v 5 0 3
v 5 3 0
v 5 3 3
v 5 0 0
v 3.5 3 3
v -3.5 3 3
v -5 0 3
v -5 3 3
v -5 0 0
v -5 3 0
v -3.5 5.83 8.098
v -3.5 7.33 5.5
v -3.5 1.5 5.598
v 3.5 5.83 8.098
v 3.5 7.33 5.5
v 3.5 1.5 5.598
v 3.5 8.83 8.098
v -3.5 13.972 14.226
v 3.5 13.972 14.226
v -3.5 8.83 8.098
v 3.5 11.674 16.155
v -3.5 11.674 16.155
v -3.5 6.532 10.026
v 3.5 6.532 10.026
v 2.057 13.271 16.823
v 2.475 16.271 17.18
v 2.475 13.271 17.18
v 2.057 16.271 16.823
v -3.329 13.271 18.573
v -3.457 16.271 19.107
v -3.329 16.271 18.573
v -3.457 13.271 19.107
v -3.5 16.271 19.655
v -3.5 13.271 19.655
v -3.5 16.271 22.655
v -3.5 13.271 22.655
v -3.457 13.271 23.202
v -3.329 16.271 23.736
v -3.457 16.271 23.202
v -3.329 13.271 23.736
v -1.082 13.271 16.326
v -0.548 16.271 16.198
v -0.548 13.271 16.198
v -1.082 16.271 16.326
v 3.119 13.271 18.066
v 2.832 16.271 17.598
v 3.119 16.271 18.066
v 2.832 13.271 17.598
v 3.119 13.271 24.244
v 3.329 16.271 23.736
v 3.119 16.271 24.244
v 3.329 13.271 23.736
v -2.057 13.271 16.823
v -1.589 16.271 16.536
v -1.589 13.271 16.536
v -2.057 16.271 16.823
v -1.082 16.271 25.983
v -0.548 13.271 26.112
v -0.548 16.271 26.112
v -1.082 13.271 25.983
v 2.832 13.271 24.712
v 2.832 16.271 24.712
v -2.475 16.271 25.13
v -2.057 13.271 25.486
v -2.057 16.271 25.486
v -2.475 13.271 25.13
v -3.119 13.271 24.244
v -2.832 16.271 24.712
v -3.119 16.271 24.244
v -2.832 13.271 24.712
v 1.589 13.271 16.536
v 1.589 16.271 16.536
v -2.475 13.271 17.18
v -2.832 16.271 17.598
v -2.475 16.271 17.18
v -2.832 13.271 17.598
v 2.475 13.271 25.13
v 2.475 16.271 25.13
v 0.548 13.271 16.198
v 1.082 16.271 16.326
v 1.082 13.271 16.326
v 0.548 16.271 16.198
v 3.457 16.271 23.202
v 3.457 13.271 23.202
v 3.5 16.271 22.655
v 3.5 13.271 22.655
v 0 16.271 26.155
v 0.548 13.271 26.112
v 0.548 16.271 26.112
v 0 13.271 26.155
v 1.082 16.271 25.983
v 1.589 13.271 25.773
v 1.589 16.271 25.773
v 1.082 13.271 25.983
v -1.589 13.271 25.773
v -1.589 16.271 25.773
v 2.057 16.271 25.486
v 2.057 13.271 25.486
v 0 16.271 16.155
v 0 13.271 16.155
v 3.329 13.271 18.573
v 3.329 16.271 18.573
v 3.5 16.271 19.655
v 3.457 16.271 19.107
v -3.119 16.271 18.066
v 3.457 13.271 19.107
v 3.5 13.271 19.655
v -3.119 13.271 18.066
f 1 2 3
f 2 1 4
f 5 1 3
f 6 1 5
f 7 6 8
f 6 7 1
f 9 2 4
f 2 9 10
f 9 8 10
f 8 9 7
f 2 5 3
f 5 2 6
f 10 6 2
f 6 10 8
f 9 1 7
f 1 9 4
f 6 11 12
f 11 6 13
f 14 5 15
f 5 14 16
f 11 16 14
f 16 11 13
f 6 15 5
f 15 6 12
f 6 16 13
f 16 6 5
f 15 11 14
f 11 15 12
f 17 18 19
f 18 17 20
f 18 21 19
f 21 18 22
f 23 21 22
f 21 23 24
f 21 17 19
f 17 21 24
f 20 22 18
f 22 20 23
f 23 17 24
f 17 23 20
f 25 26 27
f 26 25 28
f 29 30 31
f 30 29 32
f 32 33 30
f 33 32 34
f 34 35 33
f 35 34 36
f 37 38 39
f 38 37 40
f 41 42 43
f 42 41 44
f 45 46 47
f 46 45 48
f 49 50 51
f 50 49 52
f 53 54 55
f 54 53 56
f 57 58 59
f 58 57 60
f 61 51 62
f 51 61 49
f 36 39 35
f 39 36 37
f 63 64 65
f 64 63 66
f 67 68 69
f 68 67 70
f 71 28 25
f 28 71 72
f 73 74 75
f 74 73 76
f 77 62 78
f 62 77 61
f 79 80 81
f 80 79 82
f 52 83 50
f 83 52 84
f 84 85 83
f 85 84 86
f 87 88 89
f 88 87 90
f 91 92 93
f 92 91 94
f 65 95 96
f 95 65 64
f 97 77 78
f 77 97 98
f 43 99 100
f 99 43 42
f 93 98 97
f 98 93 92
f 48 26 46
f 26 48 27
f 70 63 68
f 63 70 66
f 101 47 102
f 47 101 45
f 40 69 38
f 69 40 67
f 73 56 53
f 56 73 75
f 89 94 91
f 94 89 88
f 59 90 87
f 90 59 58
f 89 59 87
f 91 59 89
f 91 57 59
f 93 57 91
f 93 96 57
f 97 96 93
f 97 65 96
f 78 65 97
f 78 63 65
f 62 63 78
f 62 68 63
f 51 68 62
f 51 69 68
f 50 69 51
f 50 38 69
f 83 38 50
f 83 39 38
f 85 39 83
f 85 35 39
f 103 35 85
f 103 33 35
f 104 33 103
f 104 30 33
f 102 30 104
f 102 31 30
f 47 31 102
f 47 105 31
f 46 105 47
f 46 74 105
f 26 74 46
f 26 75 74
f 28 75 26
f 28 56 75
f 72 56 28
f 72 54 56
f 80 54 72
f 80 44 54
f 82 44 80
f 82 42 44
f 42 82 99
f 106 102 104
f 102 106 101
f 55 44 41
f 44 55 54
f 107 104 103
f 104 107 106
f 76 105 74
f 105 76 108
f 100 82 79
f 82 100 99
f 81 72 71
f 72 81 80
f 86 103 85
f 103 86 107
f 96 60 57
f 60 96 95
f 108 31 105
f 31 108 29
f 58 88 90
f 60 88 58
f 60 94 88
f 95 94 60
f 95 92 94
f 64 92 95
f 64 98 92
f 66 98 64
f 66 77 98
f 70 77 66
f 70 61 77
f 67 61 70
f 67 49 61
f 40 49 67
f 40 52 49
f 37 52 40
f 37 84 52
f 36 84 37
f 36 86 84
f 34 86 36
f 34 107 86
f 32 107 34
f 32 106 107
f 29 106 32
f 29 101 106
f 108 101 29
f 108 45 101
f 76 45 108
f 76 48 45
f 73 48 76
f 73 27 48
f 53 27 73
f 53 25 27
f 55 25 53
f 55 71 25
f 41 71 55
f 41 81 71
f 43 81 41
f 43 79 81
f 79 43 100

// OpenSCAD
include <../colors.scad>
include <../parameters.scad>

use <../lib/functions.scad>
use <../lib/plist.scad>
use <../lib/shapes2d.scad>
use <../lib/shapes3d.scad>
use <../lib/slots.scad>
use <../lib/transforms.scad>

function m_id() = [[1, 0, 0, 0],
                   [0, 1, 0, 0],
                   [0, 0, 1, 0],
                   [0, 0, 0, 1]];

function m_mul(A, B) = [for (i=[0:3]) [for (j=[0:3])
  A[i][0]*B[0][j] + A[i][1]*B[1][j] + A[i][2]*B[2][j] + A[i][3]*B[3][j]]];

function m_t(x, y, z) = [[1, 0, 0, x],
                         [0, 1, 0, y],
                         [0, 0, 1, z],
                         [0, 0, 0, 1]];

// compute the same "y" and "z" as old_polyarm did
function seg_yz(w, l, t, angle) =
  let (b = is_num(angle) ? rot_x_bbox_align([w, l, t], angle=angle) : [])
  // b[0]=rot_y_size, b[1]=rot_z_size
  [is_num(angle) ? b[0] : l,
   is_num(angle) ? b[1] : 0];

function build_tfs_bboxwalk(specs,
                            thickness,
                            w_default,
                            i=0,
                            tf=m_id(),
                            acc=[]) =
  (i >= len(specs))
  ? concat(acc, [tf])
  : let (spec  = specs[i],
         ww    = plist_get("w", spec, w_default),
         l     = plist_get("l", spec, 0),
         t     = plist_get("thickness", spec, with_default(thickness, w_default)),
         angle = plist_get("angle", spec, 0),
         yz    = seg_yz(ww, l, t, angle),
         ystep = yz[0],
         zstep = yz[1])
    build_tfs_bboxwalk(specs,
                       thickness,
                       w_default,
                       i + 1,
                       m_mul(tf, m_t(0, ystep, zstep)),
                       concat(acc, [tf]));

function step_vec(l, angle) = [0, l*cos(angle), l*sin(angle)];

function build_tfs_kinematic(specs, i=0, tf=m_id(), acc=[]) =
  (i >= len(specs))
  ? concat(acc, [tf])
  : let (l     = plist_get("l", specs[i], 0),
         angle = plist_get("angle", specs[i], 0),
         dv    = step_vec(l, angle))
    build_tfs_kinematic(specs,
                        i + 1,
                        m_mul(tf, m_t(dv[0], dv[1], dv[2])),
                        concat(acc, [tf]));

module segment_center_x(size,
                        type,
                        slot,
                        r_factor,
                        r,
                        side,
                        fn,
                        slot_mode=false) {
  module _segment() {
    if (!slot_mode) {
      if (type == "cylinder") {
        translate([0, 0, 0]) {
          rotate([-90, 0, 0]) {
            cylinder(d=size[0], h=size[1], $fn=with_default(fn, 40));
          }
        }
      } else if ((is_num(r) && r != 0) || (is_num(r_factor) && r_factor != 0)) {
        translate([0, size[1] / 2, 0]) {
          linear_extrude(height=size[2], center=false) {
            rounded_rect([size[0], size[1]],
                         center=true,
                         r_factor=r_factor,
                         fn=with_default(fn, 40),
                         side=side);
          }
        }
      } else {
        cuboid(size, anchor=[0, 1, 1]);
      }
    }
  }

  if (slot_mode) {
    if (!is_undef(slot)) {
      let (slot_type = plist_get("type", slot),
           l = size[1],
           y =  plist_get("y", slot, 0),
           d =  plist_get("d", slot),
           h = size[2]) {
        if (slot_mode) {
          if (slot_type == "counterbore") {
            translate([0, l - d / 2 - y, 0]) {
              counterbore_from_plist(plist_merge(slot, ["h", h]));
            }
          }
        }
      }
    }
  } else {
    _segment();
  }
}

function add_bbox(spec=[], w=0, thickness=0) =
  let (angle = plist_get("angle", spec, 0),
       l = plist_get("l", spec, 0),
       w = plist_get("w", spec, w),
       t = plist_get("thickness", spec, thickness),
       bbox = is_num(angle)
              ? rot_x_bbox_align([w, l, t], angle=angle)
              : [],
       bbox_l = bbox[0],
       bbox_h = bbox[1],
       y = is_num(bbox_l) ? bbox_l : l,
       z = is_num(bbox_h) ? bbox_h : 0)
  echo("w",
       w,
       "angle",
       angle,
       "y",
       y,
       "bbox_l",
       bbox_l,
       "bbox_h",
       bbox_h,
       "l",
       l,
       "bbox",
       bbox)
  plist_merge(spec,
              ["y", y,
               "z", z,
               "bbox", bbox,
               "w", w,
               "t", t,
               "angle", angle]);

module old_polyarm(specs,
                   thickness,
                   w=7,
                   type,
                   debug_hull=false,
                   debug=false) {
  plists = [for (spec = specs)
    add_bbox(spec,
             thickness=with_default(thickness, w),
             w=w)];
  y_sizes = [for (v = plists) plist_get("y", v)];
  z_sizes = [for (v = plists) plist_get("z", v)];
  widths = [for (v = plists) plist_get("w", v)];
  thicknesses = [for (v = plists) plist_get("t", v)];
  max_w = max(widths);
  max_t = max(thicknesses);

  module _segments(slot_mode=false, offset_mode=false) {
    for (i = [0 : len(plists) - 1]) {
      let (plist = plists[i],
           item_type = plist_get("type", plist, type),
           w = plist_get("w", plist),
           l = plist_get("l", plist),
           t = plist_get("t", plist),
           r_factor = plist_get("r_factor", plist),
           slot=plist_get("slot", plist),
           r=plist_get("r", plist),
           side=plist_get("side", plist),
           fn=plist_get("fn", plist),
           angle = plist_get("angle", plist),
           prev_y_acc = sum(y_sizes, i),
           prev_z_acc = sum(z_sizes, i)) {

        translate([0, prev_y_acc, prev_z_acc]) {
          maybe_translate([0, offset_mode ? -t : 0, offset_mode ? t : 0]) {
            maybe_rotate([angle, 0, 0]) {
              if (offset_mode) {
                segment_center_x([max_w + 1, l, t],
                                 slot_mode=slot_mode,
                                 r_factor=r_factor,
                                 r=r,
                                 side=side,
                                 fn=fn,
                                 slot=slot,
                                 type=item_type);
              } else if (slot_mode) {
                segment_center_x([w, l, max_t + l],
                                 slot_mode=slot_mode,
                                 r_factor=r_factor,
                                 r=r,
                                 side=side,
                                 fn=fn,
                                 slot=slot,
                                 type=item_type);
              } else {
                {
                  segment_center_x([w, l, t],
                                   slot_mode=slot_mode,
                                   r_factor=r_factor,
                                   r=r,
                                   side=side,
                                   fn=fn,
                                   slot=slot,
                                   type=item_type);
                }
              }
            }
          }
        }
      }
    }
  }
  if (debug || debug_hull) {
    if (debug_hull) {
      hull() {
        _segments(slot_mode=false);
      }
    } else {
      _segments(slot_mode=false);
    }
  } else {
    difference() {
      difference() {
        hull() {
          _segments(slot_mode=false);
        }
        hull() {
          _segments(offset_mode=true);
        }
      }
      _segments(slot_mode=true);
    }
  }
}

module polyarm(specs, thickness, w=7, type="cube", debug, debug_hull) {

  widths = [for (spec = specs) plist_get("w", spec, w)];
  max_w = max(widths);

  tfs = build_tfs_bboxwalk(specs, thickness, w);
  bboxes = [for (spec = specs)
    let (ww    = plist_get("w", spec, w),
         l     = plist_get("l", spec, 0),
         t     = plist_get("thickness", spec, with_default(thickness, w)),
         angle = plist_get("angle", spec, 0))
    is_num(angle)
    ? rot_x_bbox_align([ww, l, t], angle=angle)
    : [l, t, 0, 0, l, t]];

  function tf_point(tf, p) =
    [tf[0][0]*p[0] + tf[0][1]*p[1] + tf[0][2]*p[2] + tf[0][3],
     tf[1][0]*p[0] + tf[1][1]*p[1] + tf[1][2]*p[2] + tf[1][3],
     tf[2][0]*p[0] + tf[2][1]*p[1] + tf[2][2]*p[2] + tf[2][3]];

  module _segments(slot_mode=false, offset_mode=false) {
    for (i=[0:len(specs)-1]) {
      let (spec      = specs[i],
           item_type = plist_get("type", spec, type),
           ww        = plist_get("w", spec, w),
           l         = plist_get("l", spec, 0),
           t         = plist_get("thickness", spec, with_default(thickness, w)),
           r_factor  = plist_get("r_factor", spec),
           slot      = plist_get("slot", spec),
           r         = plist_get("r", spec),
           side      = plist_get("side", spec),
           fn        = plist_get("fn", spec),
           angle     = plist_get("angle", spec, 0)) {
        multmatrix(tfs[i]) {
          maybe_translate([0, offset_mode ? -t : 0, offset_mode ?  t : 0]) {
            maybe_rotate([angle, 0, 0]) {
              segment_center_x(offset_mode ? [max_w + 1, l, t] : [ww, l, t],
                               type=item_type,
                               slot=slot,
                               r_factor=r_factor,
                               r=r,
                               side=side,
                               fn=fn,
                               slot_mode=slot_mode);
            }
          }
        }
      }
    }
  }

  module _joints() {
    for (i=[0:len(specs)-2]) {
      let (spec      = specs[i],
           next_spec = specs[i + 1],
           ww        = plist_get("w", spec, w),
           next_w    = plist_get("w", next_spec, w),
           cap_w     = max([ww, next_w, max_w]),
           bbox      = bboxes[i],
           next_bbox = bboxes[i + 1],
           end_y     = bbox[4],
           end_z_min = bbox[3],
           end_z_max = bbox[5],
           start_y   = next_bbox[2],
           start_z_min = next_bbox[3],
           start_z_max = next_bbox[5],
           end_p_min = tf_point(tfs[i], [0, end_y, end_z_min]),
           end_p_max = tf_point(tfs[i], [0, end_y, end_z_max]),
           start_p_min = tf_point(tfs[i + 1], [0, start_y, start_z_min]),
           start_p_max = tf_point(tfs[i + 1], [0, start_y, start_z_max]),
           pts = [[end_p_min[1],   end_p_min[2]],
                  [end_p_max[1],   end_p_max[2]],
                  [start_p_max[1], start_p_max[2]],
                  [start_p_min[1], start_p_min[2]]]) {
        rotate([0, -90, 0]) {
          linear_extrude(height=cap_w, center=false) {
            polygon(points=pts);
          }
        }
      }
    }
  }

  if (debug || debug_hull) {
    if (debug_hull) {
      hull() {
        _segments(slot_mode=false);
      }
    } else {
      _segments(slot_mode=false);
    }
  } else {
    difference() {
      difference() {
        hull() {
          _segments(slot_mode=false);
        }
        hull() {
          _segments(offset_mode=true);
        }
      }
      _segments(slot_mode=true);
    }
  }
}

items = [["l", 3,
          "w", 10,],
         ["l", 5,
          "angle", 30],
         ["l", 8,
          "angle", 50],
         ["l", 10,
          "r_factor", 0.5,
          "angle", 90,
          "slot", ["type", "counterbore",
                   "d", m3_hole_dia,
                   "y", 1]]];

old_polyarm(items,
            debug=true,
            debug_hull=false,
            w=7,
            thickness=3);

// polyarm(items,
//         w=10,
//         thickness=2);
